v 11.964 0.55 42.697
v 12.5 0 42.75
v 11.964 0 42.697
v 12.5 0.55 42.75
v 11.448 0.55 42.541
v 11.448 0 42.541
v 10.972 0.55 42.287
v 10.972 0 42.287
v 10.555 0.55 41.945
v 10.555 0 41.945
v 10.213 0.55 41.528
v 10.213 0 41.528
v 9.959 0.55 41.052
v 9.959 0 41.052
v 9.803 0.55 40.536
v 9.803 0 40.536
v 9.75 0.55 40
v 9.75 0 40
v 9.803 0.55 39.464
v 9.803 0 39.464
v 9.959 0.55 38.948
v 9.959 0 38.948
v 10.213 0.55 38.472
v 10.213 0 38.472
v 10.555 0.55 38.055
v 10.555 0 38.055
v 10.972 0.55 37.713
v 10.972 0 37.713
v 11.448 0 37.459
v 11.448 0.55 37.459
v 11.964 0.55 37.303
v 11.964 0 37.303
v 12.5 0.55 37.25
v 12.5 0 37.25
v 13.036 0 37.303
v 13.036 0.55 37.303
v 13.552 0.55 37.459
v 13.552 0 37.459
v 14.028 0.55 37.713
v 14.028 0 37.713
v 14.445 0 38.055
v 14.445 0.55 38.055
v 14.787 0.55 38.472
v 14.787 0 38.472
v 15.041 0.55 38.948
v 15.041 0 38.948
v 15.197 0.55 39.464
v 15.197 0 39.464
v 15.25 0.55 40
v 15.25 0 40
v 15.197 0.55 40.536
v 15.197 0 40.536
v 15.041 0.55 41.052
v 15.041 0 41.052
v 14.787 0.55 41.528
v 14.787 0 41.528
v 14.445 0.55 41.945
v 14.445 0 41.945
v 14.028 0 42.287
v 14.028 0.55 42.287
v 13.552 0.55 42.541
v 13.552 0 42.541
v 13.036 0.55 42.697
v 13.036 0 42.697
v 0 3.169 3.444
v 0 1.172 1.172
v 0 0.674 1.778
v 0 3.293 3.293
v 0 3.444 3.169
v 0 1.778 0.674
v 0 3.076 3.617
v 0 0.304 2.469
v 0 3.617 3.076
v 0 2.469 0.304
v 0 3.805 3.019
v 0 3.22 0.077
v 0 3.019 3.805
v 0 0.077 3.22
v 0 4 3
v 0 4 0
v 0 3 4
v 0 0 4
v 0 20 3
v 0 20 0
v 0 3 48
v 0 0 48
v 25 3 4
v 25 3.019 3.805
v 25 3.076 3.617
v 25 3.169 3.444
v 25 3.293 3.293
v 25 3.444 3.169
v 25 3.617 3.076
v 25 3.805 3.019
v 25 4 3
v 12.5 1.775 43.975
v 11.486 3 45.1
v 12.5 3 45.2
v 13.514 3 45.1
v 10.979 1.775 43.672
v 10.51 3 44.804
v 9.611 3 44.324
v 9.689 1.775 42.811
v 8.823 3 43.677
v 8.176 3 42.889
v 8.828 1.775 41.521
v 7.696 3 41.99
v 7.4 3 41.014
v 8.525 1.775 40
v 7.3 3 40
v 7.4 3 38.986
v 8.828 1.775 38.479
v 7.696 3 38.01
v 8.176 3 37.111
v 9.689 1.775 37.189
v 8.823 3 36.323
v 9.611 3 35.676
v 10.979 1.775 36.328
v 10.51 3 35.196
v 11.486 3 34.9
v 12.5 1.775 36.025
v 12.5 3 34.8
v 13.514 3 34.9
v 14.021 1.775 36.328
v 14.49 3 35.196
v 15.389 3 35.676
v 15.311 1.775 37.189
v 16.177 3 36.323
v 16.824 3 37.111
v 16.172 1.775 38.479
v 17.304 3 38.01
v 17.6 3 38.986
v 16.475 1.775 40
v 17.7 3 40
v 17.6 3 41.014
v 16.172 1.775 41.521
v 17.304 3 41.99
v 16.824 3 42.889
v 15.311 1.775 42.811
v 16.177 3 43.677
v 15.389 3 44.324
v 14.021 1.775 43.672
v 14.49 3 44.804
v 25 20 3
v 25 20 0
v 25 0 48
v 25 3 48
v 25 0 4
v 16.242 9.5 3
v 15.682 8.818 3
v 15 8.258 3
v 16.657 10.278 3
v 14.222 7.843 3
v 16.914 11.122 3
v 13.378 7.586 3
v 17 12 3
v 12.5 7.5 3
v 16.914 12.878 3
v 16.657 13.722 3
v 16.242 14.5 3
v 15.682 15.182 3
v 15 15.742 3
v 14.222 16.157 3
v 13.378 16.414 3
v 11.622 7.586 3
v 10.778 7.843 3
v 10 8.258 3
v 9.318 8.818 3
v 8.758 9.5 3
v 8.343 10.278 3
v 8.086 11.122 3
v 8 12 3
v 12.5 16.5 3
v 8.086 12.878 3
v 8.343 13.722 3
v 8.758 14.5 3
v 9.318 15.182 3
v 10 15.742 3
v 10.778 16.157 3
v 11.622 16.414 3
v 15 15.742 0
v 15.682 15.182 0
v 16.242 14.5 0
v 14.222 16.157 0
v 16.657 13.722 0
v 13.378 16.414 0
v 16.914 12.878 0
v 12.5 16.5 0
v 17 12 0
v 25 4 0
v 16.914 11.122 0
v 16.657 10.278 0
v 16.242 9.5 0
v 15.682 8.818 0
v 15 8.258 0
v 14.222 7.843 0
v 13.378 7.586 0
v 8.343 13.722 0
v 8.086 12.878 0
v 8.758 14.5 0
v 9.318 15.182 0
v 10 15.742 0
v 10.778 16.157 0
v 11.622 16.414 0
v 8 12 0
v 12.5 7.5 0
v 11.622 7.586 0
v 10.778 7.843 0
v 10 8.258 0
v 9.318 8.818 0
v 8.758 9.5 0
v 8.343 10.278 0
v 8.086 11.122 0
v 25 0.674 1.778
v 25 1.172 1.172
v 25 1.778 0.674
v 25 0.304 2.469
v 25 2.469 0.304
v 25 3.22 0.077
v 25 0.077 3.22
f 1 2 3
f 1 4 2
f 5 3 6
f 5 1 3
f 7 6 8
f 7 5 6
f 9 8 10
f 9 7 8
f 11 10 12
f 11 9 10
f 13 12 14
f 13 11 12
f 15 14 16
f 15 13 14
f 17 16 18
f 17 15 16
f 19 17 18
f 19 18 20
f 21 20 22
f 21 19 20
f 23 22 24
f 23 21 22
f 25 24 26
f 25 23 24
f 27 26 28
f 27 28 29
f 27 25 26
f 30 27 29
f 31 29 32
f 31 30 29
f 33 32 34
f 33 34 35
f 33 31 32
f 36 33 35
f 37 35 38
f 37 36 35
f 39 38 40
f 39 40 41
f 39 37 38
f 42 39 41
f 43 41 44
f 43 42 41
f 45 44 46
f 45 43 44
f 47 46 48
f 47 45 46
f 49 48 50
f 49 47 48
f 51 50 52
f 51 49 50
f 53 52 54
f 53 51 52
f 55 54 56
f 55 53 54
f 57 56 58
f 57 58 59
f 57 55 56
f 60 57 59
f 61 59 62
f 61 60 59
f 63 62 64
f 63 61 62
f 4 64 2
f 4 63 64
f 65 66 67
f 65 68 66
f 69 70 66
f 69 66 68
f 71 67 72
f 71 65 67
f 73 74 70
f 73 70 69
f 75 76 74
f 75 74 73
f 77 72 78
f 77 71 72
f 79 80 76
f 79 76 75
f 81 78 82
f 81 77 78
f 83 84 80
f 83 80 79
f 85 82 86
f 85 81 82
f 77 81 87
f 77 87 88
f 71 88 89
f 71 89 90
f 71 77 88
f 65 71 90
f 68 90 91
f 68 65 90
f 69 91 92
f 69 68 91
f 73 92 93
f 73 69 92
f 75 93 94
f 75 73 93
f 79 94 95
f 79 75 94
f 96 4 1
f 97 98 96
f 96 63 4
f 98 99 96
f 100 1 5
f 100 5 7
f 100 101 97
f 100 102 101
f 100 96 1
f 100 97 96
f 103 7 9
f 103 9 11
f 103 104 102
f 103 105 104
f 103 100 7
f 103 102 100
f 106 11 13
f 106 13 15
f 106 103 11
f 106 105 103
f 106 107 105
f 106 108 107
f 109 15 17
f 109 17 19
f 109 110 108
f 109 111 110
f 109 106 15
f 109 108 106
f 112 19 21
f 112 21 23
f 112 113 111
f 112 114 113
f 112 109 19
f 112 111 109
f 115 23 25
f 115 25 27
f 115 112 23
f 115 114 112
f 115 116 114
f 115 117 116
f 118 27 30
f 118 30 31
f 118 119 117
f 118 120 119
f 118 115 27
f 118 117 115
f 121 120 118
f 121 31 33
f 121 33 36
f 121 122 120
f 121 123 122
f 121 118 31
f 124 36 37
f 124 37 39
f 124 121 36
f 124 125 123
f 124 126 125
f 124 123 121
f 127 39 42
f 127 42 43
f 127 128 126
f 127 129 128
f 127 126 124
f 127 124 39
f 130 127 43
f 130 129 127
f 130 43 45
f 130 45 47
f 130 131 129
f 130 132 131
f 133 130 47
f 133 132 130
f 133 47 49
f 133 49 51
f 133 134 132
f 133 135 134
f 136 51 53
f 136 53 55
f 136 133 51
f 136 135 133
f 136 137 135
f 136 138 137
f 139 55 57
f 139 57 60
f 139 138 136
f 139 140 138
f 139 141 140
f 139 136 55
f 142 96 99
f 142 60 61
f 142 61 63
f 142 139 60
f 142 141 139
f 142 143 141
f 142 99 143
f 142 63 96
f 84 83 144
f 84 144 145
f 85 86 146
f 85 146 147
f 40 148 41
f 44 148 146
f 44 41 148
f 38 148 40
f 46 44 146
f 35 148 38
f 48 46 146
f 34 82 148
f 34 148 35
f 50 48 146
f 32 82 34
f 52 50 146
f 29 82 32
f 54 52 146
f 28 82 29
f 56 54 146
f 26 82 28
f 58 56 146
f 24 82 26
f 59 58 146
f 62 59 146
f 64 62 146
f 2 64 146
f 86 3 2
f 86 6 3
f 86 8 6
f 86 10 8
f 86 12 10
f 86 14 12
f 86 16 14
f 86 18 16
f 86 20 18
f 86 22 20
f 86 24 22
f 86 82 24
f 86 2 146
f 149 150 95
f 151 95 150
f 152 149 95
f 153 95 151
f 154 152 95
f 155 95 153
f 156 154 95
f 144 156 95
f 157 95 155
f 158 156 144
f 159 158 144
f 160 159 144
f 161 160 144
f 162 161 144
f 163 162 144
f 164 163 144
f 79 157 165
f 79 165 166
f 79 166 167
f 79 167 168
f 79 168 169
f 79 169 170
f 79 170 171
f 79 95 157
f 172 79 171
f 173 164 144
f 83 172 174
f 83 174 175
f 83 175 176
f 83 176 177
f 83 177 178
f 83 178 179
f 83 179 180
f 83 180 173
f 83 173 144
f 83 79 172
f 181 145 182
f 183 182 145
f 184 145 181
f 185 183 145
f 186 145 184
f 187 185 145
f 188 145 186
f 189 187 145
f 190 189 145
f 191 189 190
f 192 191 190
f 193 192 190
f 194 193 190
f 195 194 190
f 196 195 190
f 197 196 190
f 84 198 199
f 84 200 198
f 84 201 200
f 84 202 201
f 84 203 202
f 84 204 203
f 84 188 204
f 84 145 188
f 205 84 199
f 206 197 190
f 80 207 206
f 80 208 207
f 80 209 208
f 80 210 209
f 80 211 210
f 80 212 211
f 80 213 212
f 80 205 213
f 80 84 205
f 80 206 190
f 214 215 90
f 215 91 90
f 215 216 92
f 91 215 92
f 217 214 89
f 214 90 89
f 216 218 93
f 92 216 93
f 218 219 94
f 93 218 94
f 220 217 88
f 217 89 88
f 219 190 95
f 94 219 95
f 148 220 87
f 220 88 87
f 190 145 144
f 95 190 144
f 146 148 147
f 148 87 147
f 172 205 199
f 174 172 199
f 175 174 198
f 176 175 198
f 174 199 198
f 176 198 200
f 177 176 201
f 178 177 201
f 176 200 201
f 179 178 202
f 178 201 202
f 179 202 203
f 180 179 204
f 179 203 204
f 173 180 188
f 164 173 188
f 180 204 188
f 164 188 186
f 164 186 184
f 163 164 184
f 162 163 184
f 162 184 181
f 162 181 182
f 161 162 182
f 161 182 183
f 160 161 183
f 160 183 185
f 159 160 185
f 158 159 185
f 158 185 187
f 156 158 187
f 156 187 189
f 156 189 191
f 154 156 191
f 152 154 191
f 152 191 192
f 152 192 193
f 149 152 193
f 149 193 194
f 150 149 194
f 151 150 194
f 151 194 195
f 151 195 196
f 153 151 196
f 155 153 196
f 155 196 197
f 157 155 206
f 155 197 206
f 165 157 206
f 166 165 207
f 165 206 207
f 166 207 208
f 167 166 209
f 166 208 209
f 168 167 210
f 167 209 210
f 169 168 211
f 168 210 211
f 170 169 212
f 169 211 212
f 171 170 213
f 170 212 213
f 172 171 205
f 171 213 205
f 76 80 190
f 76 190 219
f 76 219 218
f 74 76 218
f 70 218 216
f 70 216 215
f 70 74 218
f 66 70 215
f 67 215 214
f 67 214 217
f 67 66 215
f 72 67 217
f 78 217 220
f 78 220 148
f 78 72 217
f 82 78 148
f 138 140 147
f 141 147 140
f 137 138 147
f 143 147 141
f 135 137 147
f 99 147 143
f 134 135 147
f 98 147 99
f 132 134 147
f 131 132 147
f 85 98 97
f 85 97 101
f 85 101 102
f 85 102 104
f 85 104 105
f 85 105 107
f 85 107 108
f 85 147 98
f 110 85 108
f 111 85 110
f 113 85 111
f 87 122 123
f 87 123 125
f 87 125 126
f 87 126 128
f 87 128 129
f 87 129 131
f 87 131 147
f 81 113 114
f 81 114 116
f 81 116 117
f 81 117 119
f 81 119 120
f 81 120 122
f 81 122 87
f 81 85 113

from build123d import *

# Parameters (mm, degrees)
T_LE_DE_BASE_PLI_E1_DEPTH = 25
D_GAGEMENT_M81_D          = 9


# Sheet-metal steps are written as plain solids
with BuildPart() as part:
    # Esquisse1 → Tôle de base pliée1 (new body)
    with BuildSketch(Plane(origin=(0, 0, 0), x_dir=(0, 0, -1), z_dir=(1, 0, 0))):
        with BuildLine():
            Line((0, 20), (0, 4))
            ThreePointArc((0, 4), (-1.171572875, 1.171572875), (-4, 0))
            Line((-4, 0), (-48, 0))
            Line((-48, 0), (-48, 3))
            Line((-48, 3), (-4, 3))
            ThreePointArc((-4, 3), (-3.292893219, 3.292893219), (-3, 4))
            Line((-3, 4), (-3, 20))
            Line((-3, 20), (0, 20))
        make_face()
    extrude(amount=T_LE_DE_BASE_PLI_E1_DEPTH)

    # Esquisse3 → Fraisage pour vis à tête fraisée M51 (revolve, cut)
    with BuildSketch(Plane(origin=(12.5, 3, 40), x_dir=(0, 0, 1), z_dir=(1, 0, 0))):
        Polygon((0, 0), (0, 3), (2.75, 3), (2.75, 2.45), (5.2, 0), align=None)
    revolve(axis=Axis((12.5, 9.35, 40), (0, -1, 0)), mode=Mode.SUBTRACT)

    # Dégagement M81 (through all)
    with Locations(Plane.XY.offset(3)):
        with Locations((12.5, 12)):
            Hole(D_GAGEMENT_M81_D / 2)


solid = part.part
